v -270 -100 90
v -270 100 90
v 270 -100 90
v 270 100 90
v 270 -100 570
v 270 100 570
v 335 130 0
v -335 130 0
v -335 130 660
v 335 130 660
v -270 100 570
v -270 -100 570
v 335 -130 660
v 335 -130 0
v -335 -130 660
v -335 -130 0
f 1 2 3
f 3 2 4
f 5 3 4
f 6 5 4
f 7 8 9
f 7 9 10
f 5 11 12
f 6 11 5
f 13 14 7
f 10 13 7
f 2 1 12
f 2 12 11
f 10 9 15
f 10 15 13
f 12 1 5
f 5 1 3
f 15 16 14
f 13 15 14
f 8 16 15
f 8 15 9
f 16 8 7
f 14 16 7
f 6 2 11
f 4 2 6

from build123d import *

# Parameters (mm, degrees)
F1_W     = 540
F1_H     = 200
F2_DEPTH = 480
F3_W     = 670
F3_H     = 260
F4_DEPTH = 660


with BuildPart() as f2:
    # F1 (on offset) → F2 (new body)
    with BuildSketch(Plane.XY.offset(90)):
        Rectangle(F1_W, F1_H)
    extrude(amount=F2_DEPTH)


with BuildPart() as f4:
    # F3 (on Top) → F4 (new body)
    with BuildSketch(Plane.XY):
        Rectangle(F3_W, F3_H)
    extrude(amount=F4_DEPTH)


solid = Compound([f2.part, f4.part])
